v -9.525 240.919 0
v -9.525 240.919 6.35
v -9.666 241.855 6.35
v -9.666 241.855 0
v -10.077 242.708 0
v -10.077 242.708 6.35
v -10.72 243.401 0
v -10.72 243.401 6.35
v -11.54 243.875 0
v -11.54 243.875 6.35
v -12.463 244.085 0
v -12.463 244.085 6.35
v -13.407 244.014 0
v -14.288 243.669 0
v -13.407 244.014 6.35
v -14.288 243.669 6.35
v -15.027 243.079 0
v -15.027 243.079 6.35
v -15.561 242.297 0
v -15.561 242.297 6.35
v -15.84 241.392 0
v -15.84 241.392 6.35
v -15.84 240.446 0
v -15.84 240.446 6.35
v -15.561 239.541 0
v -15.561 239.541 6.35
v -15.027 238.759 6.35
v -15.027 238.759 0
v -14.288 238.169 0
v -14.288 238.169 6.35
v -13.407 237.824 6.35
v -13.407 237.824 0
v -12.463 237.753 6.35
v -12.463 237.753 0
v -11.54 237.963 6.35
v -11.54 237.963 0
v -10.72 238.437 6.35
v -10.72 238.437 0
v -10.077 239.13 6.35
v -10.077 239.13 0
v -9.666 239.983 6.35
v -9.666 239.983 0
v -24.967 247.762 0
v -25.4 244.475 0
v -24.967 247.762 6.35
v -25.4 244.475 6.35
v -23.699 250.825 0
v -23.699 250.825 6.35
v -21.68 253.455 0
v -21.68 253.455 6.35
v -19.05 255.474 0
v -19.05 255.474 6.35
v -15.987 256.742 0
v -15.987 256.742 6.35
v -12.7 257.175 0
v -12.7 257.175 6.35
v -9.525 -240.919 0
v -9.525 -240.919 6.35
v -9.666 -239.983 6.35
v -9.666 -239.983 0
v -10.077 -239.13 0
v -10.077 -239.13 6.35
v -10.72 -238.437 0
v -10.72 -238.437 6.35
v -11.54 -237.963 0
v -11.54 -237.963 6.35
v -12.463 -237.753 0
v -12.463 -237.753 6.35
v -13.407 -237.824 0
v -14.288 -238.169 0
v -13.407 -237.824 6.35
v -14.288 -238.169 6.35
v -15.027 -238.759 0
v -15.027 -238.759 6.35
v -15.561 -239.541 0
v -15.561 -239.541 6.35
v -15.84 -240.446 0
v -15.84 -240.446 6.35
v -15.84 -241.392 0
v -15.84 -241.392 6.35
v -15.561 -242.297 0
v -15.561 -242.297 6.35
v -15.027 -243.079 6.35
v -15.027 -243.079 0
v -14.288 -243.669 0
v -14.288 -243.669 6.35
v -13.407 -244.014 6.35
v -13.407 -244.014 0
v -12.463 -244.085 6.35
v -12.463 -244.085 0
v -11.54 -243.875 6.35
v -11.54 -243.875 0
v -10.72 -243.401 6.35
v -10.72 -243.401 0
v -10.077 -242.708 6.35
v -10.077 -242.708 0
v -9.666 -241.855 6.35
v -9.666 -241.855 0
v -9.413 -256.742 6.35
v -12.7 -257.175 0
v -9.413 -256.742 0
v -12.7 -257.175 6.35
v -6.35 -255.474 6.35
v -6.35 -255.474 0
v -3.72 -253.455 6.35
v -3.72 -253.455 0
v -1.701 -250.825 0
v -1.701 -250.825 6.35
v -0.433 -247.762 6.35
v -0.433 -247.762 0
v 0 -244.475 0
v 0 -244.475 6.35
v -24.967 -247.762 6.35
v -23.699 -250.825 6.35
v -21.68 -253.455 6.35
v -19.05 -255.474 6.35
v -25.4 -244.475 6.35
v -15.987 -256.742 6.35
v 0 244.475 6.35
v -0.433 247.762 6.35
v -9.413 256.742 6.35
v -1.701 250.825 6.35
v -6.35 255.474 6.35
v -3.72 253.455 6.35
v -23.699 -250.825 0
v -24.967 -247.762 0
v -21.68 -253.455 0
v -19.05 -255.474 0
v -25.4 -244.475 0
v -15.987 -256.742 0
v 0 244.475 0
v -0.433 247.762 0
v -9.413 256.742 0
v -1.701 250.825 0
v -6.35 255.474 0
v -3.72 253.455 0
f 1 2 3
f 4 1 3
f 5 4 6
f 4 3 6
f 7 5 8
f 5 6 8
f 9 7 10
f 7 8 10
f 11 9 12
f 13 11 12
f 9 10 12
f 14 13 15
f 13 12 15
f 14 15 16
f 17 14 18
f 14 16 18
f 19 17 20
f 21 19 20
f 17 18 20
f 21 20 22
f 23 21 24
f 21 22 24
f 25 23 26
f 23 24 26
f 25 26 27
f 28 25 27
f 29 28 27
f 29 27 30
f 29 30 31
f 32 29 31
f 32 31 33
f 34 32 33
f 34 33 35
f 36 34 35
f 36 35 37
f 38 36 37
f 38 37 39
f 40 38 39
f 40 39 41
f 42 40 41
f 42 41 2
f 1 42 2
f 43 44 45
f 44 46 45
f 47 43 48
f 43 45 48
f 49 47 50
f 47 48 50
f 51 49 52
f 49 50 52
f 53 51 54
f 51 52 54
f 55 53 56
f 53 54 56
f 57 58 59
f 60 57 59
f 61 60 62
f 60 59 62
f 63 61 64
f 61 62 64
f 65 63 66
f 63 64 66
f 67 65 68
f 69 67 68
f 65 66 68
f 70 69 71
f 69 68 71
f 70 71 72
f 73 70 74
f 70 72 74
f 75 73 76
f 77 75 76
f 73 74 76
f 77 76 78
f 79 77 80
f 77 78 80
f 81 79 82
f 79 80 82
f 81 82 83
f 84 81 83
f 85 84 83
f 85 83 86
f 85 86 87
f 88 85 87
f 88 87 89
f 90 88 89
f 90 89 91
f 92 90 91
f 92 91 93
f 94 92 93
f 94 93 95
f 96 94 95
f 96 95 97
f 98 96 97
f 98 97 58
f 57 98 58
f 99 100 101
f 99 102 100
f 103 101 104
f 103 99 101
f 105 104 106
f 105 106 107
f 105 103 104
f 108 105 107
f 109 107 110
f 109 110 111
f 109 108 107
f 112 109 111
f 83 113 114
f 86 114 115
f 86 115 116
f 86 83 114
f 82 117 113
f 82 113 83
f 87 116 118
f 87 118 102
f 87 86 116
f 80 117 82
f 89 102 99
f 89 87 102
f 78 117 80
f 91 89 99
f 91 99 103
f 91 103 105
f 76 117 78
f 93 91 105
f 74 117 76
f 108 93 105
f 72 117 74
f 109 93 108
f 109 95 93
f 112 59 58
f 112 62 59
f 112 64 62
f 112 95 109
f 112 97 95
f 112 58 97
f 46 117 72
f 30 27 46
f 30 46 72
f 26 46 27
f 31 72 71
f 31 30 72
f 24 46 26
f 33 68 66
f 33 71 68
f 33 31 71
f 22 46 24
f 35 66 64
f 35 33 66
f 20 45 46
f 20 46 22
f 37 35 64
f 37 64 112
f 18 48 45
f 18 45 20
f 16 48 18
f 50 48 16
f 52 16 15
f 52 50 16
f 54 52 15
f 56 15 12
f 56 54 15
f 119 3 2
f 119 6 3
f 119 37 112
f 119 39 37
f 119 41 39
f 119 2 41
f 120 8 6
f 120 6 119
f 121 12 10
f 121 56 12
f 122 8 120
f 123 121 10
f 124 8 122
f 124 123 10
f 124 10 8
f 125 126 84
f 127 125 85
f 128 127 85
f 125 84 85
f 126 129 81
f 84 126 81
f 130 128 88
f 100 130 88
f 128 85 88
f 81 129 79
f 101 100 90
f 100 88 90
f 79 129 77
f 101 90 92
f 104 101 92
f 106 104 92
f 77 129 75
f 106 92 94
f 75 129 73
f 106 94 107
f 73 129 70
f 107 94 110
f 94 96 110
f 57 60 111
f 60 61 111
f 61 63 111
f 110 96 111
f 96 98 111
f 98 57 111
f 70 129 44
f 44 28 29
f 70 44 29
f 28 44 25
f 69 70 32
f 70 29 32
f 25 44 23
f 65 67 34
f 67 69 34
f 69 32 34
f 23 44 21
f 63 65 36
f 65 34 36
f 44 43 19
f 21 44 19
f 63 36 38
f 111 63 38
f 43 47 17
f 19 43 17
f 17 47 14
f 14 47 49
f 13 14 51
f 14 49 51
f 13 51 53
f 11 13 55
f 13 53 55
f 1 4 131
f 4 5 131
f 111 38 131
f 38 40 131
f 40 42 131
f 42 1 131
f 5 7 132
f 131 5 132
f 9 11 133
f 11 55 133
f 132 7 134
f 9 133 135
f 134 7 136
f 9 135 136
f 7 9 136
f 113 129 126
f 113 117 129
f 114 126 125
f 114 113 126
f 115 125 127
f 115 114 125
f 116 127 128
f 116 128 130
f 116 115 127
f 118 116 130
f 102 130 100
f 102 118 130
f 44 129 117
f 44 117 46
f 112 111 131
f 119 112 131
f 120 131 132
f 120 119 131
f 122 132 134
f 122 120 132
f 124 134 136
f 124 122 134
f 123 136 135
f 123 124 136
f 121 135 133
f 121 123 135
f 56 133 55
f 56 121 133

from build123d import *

# Parameters (mm, degrees)
SKETCH1_W           = 25.4
SKETCH1_H           = 514.35
BOSS_EXTRUDE1_DEPTH = 6.35
FILLET1_R           = 12.7
FILLET2_R           = 12.7
SKETCH2_R           = 3.175
CUT_EXTRUDE1_DEPTH  = 259.504280671


with BuildPart() as part:
    # Sketch1 → Boss-Extrude1 (new body)
    with BuildSketch(Plane.XY):
        with Locations((-12.7, 0)):
            Rectangle(SKETCH1_W, SKETCH1_H)
    extrude(amount=BOSS_EXTRUDE1_DEPTH)

    # Fillet1
    fillet1_edges = [part.edges().sort_by_distance(p)[0] for p in [
        (-25.4, 257.175, 3.175),
        (0, 257.175, 3.175),
    ]]
    fillet(fillet1_edges, radius=FILLET1_R - 0.0001)  # a hair under: the kernel refuses the full size

    # Fillet2
    fillet2_edges = [part.edges().sort_by_distance(p)[0] for p in [
        (-25.4, -257.175, 3.175),
        (0, -257.175, 3.175),
    ]]
    fillet(fillet2_edges, radius=FILLET2_R - 0.0001)  # a hair under: the kernel refuses the full size

    # Sketch2 → Cut-Extrude1 (cut, through all)
    with BuildSketch(Plane.XY.offset(6.35)):
        with Locations((-12.7, 240.919)):
            Circle(SKETCH2_R)
        with Locations((-12.7, -240.919)):
            Circle(SKETCH2_R)
    extrude(amount=-CUT_EXTRUDE1_DEPTH, mode=Mode.SUBTRACT)


solid = part.part
